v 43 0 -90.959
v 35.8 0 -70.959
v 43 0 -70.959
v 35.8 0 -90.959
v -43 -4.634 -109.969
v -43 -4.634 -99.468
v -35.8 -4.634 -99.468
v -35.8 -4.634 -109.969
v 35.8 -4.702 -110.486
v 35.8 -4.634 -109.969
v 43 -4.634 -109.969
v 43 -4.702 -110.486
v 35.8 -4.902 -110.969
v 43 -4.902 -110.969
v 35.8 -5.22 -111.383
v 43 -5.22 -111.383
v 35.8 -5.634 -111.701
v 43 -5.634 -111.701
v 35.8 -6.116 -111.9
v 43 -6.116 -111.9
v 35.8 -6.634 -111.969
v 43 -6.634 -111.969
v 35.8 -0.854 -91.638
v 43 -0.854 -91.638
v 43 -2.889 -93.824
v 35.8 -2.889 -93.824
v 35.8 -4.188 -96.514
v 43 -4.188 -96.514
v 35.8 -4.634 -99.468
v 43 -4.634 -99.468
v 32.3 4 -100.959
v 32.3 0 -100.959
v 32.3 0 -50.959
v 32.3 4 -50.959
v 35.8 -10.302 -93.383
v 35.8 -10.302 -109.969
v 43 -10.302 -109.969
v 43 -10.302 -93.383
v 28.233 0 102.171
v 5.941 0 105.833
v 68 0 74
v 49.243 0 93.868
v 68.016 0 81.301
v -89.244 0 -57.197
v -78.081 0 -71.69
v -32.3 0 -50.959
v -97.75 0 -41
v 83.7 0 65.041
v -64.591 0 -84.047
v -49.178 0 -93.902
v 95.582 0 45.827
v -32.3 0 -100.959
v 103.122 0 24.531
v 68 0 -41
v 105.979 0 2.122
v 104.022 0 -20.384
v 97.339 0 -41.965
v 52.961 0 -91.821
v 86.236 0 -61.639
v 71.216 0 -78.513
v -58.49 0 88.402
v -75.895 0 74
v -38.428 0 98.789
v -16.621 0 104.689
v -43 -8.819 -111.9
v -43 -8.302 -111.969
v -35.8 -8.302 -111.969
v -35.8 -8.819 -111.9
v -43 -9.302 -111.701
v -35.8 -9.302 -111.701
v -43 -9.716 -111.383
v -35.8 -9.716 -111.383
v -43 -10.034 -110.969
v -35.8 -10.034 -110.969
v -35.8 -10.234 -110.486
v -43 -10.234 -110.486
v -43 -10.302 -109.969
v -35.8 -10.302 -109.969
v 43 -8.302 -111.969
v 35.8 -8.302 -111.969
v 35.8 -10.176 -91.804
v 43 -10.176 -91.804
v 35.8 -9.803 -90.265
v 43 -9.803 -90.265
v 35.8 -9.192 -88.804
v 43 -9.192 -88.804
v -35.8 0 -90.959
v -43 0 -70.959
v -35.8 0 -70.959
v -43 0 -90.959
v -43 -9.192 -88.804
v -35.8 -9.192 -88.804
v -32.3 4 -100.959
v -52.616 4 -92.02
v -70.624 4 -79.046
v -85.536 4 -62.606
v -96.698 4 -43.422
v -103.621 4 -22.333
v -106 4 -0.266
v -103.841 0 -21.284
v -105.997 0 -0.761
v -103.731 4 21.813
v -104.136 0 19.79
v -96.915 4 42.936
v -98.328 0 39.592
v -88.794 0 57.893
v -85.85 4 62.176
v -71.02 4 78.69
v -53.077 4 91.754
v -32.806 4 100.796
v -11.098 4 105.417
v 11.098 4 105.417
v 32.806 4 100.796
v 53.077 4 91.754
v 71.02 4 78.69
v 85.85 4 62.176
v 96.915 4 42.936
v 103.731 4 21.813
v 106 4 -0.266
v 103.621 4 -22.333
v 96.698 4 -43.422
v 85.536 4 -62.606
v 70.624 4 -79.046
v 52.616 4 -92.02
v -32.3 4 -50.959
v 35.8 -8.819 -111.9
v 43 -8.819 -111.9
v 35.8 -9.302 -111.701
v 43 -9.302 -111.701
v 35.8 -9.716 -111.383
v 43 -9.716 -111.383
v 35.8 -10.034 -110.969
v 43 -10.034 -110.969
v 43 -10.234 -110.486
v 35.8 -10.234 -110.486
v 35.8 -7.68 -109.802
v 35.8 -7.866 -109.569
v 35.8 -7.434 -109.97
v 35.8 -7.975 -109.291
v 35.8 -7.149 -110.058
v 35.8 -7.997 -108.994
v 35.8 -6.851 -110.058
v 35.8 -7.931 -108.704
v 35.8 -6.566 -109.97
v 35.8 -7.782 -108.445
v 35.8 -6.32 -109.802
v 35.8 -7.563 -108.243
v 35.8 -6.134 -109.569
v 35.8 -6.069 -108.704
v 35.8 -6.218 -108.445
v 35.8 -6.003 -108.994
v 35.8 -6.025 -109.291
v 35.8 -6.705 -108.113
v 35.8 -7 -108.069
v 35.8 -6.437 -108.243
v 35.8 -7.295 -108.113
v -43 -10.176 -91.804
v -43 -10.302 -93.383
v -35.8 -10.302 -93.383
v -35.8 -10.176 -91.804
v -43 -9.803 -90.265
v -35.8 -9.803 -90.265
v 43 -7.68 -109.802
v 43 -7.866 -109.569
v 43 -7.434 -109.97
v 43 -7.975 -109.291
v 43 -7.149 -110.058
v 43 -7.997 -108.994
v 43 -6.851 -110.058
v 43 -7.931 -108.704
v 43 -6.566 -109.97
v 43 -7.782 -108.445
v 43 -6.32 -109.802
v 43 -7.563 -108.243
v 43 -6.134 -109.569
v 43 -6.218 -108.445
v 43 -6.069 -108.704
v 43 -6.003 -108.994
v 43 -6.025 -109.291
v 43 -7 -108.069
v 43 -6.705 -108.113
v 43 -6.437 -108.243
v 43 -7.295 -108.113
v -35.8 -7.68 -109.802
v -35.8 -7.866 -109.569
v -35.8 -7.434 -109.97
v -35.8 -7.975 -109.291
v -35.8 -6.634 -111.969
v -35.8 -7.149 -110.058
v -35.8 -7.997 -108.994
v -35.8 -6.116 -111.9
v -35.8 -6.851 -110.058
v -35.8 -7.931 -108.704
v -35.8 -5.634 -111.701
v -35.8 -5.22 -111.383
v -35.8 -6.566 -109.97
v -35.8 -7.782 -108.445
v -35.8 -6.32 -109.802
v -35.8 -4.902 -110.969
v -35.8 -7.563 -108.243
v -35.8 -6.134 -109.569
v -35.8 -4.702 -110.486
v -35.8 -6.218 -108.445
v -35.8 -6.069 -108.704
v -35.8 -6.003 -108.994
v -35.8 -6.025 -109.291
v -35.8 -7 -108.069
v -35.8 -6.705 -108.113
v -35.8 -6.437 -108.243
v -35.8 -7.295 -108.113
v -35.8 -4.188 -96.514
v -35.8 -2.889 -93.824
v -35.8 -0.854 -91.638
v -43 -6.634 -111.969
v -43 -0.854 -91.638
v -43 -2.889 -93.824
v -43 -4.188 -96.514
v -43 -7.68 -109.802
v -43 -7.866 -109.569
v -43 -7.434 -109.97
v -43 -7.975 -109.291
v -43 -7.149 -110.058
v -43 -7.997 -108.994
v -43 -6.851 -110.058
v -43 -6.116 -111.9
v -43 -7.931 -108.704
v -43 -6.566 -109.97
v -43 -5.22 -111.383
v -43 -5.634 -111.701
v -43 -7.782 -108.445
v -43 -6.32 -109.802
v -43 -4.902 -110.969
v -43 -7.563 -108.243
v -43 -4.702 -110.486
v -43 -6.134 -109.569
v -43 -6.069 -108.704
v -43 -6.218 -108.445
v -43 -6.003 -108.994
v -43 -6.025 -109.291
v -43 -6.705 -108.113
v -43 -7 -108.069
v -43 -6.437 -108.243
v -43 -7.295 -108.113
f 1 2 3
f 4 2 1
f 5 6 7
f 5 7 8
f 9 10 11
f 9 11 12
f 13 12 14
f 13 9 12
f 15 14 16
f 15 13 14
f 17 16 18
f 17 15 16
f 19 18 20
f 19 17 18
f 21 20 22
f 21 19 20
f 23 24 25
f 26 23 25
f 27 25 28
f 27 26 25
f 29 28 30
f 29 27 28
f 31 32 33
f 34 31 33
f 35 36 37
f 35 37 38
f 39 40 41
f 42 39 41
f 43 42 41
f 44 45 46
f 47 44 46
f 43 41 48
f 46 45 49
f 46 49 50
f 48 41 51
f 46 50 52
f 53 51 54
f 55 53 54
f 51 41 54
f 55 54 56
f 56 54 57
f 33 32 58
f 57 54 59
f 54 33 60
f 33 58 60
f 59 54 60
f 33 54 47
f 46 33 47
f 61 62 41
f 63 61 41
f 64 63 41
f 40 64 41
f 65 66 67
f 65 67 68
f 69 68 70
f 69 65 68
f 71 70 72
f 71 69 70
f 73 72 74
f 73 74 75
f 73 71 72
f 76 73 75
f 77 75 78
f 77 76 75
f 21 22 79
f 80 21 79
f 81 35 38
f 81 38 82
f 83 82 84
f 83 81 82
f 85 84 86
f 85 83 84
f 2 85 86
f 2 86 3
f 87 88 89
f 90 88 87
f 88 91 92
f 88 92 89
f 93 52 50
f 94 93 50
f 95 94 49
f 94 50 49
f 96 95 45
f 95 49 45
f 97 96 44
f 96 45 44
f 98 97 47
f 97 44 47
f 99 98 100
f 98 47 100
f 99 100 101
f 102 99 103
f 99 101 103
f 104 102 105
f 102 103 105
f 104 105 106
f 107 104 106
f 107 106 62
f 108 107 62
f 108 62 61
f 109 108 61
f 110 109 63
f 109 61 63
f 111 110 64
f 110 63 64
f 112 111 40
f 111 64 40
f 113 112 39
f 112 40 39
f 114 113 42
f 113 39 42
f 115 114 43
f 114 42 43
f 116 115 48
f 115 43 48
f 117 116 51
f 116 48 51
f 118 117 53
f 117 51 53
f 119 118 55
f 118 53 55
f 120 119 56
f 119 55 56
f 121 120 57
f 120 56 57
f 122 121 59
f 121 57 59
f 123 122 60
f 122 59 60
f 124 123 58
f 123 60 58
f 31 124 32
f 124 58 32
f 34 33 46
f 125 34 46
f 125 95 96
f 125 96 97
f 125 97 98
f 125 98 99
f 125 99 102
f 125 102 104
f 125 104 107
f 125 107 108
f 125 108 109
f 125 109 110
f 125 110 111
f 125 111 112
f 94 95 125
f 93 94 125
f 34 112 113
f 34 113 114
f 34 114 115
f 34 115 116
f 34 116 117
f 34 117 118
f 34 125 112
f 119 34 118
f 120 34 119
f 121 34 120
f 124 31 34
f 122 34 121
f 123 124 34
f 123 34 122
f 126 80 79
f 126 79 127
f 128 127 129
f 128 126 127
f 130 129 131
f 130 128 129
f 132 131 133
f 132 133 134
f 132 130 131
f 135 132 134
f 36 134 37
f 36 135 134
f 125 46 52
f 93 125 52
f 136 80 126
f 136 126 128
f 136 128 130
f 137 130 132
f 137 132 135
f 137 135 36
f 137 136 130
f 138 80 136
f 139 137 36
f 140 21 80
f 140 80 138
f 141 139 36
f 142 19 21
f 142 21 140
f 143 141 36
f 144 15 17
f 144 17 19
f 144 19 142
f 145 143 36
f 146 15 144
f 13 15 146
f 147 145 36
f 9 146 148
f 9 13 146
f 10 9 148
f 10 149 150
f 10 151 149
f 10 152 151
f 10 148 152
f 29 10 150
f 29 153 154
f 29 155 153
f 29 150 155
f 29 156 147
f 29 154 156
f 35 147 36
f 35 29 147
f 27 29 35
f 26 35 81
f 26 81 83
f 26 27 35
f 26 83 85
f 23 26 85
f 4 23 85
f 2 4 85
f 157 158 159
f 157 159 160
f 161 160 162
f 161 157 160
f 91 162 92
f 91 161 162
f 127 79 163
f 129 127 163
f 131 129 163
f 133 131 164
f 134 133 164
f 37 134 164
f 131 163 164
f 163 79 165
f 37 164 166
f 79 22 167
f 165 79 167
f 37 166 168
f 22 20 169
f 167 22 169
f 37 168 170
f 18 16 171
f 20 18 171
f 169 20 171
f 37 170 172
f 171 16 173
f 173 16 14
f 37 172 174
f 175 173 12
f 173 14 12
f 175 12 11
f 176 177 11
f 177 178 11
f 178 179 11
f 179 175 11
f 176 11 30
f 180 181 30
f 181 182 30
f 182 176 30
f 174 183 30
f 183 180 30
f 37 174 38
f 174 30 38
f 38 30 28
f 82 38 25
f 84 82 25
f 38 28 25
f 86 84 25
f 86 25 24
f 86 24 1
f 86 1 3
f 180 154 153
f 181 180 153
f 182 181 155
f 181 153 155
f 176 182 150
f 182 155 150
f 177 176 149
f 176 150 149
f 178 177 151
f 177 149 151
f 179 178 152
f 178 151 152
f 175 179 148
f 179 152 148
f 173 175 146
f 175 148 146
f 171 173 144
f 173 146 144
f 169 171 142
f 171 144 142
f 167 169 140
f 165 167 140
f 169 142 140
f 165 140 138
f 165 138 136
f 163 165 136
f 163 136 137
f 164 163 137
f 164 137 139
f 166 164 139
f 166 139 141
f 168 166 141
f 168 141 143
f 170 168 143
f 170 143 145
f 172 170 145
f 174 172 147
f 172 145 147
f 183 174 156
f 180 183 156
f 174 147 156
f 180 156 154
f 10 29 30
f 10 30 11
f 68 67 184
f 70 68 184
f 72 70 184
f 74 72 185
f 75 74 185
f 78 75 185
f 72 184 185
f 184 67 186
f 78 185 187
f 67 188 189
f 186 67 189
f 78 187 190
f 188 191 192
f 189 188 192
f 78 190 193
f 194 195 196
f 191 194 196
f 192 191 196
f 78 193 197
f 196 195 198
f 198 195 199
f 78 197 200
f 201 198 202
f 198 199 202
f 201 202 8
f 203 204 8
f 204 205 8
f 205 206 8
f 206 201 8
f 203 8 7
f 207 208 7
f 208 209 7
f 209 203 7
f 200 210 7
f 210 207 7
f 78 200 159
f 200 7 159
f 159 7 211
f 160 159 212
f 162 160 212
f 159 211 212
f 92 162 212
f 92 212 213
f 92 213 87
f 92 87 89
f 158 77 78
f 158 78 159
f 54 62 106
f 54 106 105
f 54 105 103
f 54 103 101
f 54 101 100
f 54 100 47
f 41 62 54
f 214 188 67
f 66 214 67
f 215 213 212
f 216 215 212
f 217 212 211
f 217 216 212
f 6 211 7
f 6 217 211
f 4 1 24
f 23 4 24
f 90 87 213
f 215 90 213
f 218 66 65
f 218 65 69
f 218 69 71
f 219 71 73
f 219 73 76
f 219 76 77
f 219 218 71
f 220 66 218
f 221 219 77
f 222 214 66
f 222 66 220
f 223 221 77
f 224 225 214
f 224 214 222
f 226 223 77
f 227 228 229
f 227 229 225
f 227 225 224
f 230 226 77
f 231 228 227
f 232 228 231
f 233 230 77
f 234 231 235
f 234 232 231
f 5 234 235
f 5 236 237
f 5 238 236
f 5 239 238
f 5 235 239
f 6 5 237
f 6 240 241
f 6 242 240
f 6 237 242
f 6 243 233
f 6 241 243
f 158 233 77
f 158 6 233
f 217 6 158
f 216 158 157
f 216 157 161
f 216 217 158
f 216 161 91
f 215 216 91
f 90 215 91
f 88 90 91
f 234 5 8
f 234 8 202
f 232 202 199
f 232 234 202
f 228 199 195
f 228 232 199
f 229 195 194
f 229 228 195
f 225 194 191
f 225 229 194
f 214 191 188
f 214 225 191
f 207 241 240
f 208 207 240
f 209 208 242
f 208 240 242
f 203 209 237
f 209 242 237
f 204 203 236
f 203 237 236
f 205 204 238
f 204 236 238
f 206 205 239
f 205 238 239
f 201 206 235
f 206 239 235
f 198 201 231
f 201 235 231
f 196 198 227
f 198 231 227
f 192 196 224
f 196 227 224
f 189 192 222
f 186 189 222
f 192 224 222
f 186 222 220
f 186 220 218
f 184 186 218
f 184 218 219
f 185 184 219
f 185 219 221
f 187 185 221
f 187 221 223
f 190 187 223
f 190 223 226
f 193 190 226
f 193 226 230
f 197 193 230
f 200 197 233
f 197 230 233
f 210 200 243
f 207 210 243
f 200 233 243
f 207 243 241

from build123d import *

# Parameters (mm, degrees)
ESTRUSIONE_ESTRUSIONE1_DEPTH = 4
SCHIZZO3_R                   = 1
ESTRUSIONE_ESTRUSIONE2_DEPTH = 7.2
RIPETIZIONE_A_L1_COUNT       = 2
RIPETIZIONE_A_L1_PITCH       = 78.8
TAGLIO_ESTRUSIONE1_DEPTH     = 0.0001


with BuildPart() as part:
    # Schizzo1 → Estrusione-Estrusione1 (new body)
    with BuildSketch(Plane(origin=(0, 0, 0), x_dir=(1, 0, 0), z_dir=(0, 1, 0))):
        with BuildLine():
            Line((0, 50.958952055), (0, -106))
            ThreePointArc((0, -106), (104.732155802, -16.345505226), (32.3, 100.958952055))
            Line((32.3, 100.958952055), (32.3, 50.958952055))
            Line((32.3, 50.958952055), (0, 50.958952055))
        make_face()
        with BuildLine():
            ThreePointArc((-32.3, 100.958952055), (-104.732155802, -16.345505226), (0, -106))
            Line((0, -106), (0, 50.958952055))
            Line((0, 50.958952055), (-32.3, 50.958952055))
            Line((-32.3, 50.958952055), (-32.3, 100.958952055))
        make_face()
    extrude(amount=ESTRUSIONE_ESTRUSIONE1_DEPTH)

    # Schizzo4 → Taglio-Estrusione1 (cut)
    with BuildSketch(Plane.XZ):
        with BuildLine():
            Line((68, -41), (68, 74))
            Line((68, 74), (-75.894663844, 74))
            ThreePointArc((-75.894663844, 74), (-104.136158772, 19.790412733), (-97.749680306, -41))
            Line((-97.749680306, -41), (68, -41))
        make_face()
    extrude(amount=-TAGLIO_ESTRUSIONE1_DEPTH, mode=Mode.SUBTRACT)


with BuildPart() as body_2:
    # Schizzo3 → Estrusione-Estrusione2 (new body)
    with BuildSketch(Plane.ZY.offset(-35.8)):
        with BuildLine():
            Line((-70.958952055, 0), (-90.958952055, 0))
            Line((-90.958952055, 0), (-91.637551092, -0.854213861))
            ThreePointArc((-91.637551092, -0.854213861), (-95.120257392, -3.639592846), (-99.467531221, -4.633971809))
            Line((-99.467531221, -4.633971809), (-109.968629526, -4.633971809))
            ThreePointArc((-109.968629526, -4.633971809), (-111.382843089, -5.219758246), (-111.968629526, -6.633971809))
            Line((-111.968629526, -6.633971809), (-111.968629526, -8.301701811))
            ThreePointArc((-111.968629526, -8.301701811), (-111.382843089, -9.715915373), (-109.968629526, -10.301701811))
            Line((-109.968629526, -10.301701811), (-93.383040263, -10.301701811))
            ThreePointArc((-93.383040263, -10.301701811), (-91.027181563, -10.020237183), (-88.803941042, -9.191687768))
            Line((-88.803941042, -9.191687768), (-70.958952055, 0))
        make_face()
        with Locations((-109.068952055, -7)):
            Circle(SCHIZZO3_R, mode=Mode.SUBTRACT)
    extrude(amount=-ESTRUSIONE_ESTRUSIONE2_DEPTH)


with BuildPart() as ripetizione_a_l1_1:
    # Ripetizione a L1: pattern copy
    add(body_2.part.moved(Location(Vector(-1, 0, 0) * (1 * RIPETIZIONE_A_L1_PITCH))))


solid = Compound([part.part, body_2.part, ripetizione_a_l1_1.part])
